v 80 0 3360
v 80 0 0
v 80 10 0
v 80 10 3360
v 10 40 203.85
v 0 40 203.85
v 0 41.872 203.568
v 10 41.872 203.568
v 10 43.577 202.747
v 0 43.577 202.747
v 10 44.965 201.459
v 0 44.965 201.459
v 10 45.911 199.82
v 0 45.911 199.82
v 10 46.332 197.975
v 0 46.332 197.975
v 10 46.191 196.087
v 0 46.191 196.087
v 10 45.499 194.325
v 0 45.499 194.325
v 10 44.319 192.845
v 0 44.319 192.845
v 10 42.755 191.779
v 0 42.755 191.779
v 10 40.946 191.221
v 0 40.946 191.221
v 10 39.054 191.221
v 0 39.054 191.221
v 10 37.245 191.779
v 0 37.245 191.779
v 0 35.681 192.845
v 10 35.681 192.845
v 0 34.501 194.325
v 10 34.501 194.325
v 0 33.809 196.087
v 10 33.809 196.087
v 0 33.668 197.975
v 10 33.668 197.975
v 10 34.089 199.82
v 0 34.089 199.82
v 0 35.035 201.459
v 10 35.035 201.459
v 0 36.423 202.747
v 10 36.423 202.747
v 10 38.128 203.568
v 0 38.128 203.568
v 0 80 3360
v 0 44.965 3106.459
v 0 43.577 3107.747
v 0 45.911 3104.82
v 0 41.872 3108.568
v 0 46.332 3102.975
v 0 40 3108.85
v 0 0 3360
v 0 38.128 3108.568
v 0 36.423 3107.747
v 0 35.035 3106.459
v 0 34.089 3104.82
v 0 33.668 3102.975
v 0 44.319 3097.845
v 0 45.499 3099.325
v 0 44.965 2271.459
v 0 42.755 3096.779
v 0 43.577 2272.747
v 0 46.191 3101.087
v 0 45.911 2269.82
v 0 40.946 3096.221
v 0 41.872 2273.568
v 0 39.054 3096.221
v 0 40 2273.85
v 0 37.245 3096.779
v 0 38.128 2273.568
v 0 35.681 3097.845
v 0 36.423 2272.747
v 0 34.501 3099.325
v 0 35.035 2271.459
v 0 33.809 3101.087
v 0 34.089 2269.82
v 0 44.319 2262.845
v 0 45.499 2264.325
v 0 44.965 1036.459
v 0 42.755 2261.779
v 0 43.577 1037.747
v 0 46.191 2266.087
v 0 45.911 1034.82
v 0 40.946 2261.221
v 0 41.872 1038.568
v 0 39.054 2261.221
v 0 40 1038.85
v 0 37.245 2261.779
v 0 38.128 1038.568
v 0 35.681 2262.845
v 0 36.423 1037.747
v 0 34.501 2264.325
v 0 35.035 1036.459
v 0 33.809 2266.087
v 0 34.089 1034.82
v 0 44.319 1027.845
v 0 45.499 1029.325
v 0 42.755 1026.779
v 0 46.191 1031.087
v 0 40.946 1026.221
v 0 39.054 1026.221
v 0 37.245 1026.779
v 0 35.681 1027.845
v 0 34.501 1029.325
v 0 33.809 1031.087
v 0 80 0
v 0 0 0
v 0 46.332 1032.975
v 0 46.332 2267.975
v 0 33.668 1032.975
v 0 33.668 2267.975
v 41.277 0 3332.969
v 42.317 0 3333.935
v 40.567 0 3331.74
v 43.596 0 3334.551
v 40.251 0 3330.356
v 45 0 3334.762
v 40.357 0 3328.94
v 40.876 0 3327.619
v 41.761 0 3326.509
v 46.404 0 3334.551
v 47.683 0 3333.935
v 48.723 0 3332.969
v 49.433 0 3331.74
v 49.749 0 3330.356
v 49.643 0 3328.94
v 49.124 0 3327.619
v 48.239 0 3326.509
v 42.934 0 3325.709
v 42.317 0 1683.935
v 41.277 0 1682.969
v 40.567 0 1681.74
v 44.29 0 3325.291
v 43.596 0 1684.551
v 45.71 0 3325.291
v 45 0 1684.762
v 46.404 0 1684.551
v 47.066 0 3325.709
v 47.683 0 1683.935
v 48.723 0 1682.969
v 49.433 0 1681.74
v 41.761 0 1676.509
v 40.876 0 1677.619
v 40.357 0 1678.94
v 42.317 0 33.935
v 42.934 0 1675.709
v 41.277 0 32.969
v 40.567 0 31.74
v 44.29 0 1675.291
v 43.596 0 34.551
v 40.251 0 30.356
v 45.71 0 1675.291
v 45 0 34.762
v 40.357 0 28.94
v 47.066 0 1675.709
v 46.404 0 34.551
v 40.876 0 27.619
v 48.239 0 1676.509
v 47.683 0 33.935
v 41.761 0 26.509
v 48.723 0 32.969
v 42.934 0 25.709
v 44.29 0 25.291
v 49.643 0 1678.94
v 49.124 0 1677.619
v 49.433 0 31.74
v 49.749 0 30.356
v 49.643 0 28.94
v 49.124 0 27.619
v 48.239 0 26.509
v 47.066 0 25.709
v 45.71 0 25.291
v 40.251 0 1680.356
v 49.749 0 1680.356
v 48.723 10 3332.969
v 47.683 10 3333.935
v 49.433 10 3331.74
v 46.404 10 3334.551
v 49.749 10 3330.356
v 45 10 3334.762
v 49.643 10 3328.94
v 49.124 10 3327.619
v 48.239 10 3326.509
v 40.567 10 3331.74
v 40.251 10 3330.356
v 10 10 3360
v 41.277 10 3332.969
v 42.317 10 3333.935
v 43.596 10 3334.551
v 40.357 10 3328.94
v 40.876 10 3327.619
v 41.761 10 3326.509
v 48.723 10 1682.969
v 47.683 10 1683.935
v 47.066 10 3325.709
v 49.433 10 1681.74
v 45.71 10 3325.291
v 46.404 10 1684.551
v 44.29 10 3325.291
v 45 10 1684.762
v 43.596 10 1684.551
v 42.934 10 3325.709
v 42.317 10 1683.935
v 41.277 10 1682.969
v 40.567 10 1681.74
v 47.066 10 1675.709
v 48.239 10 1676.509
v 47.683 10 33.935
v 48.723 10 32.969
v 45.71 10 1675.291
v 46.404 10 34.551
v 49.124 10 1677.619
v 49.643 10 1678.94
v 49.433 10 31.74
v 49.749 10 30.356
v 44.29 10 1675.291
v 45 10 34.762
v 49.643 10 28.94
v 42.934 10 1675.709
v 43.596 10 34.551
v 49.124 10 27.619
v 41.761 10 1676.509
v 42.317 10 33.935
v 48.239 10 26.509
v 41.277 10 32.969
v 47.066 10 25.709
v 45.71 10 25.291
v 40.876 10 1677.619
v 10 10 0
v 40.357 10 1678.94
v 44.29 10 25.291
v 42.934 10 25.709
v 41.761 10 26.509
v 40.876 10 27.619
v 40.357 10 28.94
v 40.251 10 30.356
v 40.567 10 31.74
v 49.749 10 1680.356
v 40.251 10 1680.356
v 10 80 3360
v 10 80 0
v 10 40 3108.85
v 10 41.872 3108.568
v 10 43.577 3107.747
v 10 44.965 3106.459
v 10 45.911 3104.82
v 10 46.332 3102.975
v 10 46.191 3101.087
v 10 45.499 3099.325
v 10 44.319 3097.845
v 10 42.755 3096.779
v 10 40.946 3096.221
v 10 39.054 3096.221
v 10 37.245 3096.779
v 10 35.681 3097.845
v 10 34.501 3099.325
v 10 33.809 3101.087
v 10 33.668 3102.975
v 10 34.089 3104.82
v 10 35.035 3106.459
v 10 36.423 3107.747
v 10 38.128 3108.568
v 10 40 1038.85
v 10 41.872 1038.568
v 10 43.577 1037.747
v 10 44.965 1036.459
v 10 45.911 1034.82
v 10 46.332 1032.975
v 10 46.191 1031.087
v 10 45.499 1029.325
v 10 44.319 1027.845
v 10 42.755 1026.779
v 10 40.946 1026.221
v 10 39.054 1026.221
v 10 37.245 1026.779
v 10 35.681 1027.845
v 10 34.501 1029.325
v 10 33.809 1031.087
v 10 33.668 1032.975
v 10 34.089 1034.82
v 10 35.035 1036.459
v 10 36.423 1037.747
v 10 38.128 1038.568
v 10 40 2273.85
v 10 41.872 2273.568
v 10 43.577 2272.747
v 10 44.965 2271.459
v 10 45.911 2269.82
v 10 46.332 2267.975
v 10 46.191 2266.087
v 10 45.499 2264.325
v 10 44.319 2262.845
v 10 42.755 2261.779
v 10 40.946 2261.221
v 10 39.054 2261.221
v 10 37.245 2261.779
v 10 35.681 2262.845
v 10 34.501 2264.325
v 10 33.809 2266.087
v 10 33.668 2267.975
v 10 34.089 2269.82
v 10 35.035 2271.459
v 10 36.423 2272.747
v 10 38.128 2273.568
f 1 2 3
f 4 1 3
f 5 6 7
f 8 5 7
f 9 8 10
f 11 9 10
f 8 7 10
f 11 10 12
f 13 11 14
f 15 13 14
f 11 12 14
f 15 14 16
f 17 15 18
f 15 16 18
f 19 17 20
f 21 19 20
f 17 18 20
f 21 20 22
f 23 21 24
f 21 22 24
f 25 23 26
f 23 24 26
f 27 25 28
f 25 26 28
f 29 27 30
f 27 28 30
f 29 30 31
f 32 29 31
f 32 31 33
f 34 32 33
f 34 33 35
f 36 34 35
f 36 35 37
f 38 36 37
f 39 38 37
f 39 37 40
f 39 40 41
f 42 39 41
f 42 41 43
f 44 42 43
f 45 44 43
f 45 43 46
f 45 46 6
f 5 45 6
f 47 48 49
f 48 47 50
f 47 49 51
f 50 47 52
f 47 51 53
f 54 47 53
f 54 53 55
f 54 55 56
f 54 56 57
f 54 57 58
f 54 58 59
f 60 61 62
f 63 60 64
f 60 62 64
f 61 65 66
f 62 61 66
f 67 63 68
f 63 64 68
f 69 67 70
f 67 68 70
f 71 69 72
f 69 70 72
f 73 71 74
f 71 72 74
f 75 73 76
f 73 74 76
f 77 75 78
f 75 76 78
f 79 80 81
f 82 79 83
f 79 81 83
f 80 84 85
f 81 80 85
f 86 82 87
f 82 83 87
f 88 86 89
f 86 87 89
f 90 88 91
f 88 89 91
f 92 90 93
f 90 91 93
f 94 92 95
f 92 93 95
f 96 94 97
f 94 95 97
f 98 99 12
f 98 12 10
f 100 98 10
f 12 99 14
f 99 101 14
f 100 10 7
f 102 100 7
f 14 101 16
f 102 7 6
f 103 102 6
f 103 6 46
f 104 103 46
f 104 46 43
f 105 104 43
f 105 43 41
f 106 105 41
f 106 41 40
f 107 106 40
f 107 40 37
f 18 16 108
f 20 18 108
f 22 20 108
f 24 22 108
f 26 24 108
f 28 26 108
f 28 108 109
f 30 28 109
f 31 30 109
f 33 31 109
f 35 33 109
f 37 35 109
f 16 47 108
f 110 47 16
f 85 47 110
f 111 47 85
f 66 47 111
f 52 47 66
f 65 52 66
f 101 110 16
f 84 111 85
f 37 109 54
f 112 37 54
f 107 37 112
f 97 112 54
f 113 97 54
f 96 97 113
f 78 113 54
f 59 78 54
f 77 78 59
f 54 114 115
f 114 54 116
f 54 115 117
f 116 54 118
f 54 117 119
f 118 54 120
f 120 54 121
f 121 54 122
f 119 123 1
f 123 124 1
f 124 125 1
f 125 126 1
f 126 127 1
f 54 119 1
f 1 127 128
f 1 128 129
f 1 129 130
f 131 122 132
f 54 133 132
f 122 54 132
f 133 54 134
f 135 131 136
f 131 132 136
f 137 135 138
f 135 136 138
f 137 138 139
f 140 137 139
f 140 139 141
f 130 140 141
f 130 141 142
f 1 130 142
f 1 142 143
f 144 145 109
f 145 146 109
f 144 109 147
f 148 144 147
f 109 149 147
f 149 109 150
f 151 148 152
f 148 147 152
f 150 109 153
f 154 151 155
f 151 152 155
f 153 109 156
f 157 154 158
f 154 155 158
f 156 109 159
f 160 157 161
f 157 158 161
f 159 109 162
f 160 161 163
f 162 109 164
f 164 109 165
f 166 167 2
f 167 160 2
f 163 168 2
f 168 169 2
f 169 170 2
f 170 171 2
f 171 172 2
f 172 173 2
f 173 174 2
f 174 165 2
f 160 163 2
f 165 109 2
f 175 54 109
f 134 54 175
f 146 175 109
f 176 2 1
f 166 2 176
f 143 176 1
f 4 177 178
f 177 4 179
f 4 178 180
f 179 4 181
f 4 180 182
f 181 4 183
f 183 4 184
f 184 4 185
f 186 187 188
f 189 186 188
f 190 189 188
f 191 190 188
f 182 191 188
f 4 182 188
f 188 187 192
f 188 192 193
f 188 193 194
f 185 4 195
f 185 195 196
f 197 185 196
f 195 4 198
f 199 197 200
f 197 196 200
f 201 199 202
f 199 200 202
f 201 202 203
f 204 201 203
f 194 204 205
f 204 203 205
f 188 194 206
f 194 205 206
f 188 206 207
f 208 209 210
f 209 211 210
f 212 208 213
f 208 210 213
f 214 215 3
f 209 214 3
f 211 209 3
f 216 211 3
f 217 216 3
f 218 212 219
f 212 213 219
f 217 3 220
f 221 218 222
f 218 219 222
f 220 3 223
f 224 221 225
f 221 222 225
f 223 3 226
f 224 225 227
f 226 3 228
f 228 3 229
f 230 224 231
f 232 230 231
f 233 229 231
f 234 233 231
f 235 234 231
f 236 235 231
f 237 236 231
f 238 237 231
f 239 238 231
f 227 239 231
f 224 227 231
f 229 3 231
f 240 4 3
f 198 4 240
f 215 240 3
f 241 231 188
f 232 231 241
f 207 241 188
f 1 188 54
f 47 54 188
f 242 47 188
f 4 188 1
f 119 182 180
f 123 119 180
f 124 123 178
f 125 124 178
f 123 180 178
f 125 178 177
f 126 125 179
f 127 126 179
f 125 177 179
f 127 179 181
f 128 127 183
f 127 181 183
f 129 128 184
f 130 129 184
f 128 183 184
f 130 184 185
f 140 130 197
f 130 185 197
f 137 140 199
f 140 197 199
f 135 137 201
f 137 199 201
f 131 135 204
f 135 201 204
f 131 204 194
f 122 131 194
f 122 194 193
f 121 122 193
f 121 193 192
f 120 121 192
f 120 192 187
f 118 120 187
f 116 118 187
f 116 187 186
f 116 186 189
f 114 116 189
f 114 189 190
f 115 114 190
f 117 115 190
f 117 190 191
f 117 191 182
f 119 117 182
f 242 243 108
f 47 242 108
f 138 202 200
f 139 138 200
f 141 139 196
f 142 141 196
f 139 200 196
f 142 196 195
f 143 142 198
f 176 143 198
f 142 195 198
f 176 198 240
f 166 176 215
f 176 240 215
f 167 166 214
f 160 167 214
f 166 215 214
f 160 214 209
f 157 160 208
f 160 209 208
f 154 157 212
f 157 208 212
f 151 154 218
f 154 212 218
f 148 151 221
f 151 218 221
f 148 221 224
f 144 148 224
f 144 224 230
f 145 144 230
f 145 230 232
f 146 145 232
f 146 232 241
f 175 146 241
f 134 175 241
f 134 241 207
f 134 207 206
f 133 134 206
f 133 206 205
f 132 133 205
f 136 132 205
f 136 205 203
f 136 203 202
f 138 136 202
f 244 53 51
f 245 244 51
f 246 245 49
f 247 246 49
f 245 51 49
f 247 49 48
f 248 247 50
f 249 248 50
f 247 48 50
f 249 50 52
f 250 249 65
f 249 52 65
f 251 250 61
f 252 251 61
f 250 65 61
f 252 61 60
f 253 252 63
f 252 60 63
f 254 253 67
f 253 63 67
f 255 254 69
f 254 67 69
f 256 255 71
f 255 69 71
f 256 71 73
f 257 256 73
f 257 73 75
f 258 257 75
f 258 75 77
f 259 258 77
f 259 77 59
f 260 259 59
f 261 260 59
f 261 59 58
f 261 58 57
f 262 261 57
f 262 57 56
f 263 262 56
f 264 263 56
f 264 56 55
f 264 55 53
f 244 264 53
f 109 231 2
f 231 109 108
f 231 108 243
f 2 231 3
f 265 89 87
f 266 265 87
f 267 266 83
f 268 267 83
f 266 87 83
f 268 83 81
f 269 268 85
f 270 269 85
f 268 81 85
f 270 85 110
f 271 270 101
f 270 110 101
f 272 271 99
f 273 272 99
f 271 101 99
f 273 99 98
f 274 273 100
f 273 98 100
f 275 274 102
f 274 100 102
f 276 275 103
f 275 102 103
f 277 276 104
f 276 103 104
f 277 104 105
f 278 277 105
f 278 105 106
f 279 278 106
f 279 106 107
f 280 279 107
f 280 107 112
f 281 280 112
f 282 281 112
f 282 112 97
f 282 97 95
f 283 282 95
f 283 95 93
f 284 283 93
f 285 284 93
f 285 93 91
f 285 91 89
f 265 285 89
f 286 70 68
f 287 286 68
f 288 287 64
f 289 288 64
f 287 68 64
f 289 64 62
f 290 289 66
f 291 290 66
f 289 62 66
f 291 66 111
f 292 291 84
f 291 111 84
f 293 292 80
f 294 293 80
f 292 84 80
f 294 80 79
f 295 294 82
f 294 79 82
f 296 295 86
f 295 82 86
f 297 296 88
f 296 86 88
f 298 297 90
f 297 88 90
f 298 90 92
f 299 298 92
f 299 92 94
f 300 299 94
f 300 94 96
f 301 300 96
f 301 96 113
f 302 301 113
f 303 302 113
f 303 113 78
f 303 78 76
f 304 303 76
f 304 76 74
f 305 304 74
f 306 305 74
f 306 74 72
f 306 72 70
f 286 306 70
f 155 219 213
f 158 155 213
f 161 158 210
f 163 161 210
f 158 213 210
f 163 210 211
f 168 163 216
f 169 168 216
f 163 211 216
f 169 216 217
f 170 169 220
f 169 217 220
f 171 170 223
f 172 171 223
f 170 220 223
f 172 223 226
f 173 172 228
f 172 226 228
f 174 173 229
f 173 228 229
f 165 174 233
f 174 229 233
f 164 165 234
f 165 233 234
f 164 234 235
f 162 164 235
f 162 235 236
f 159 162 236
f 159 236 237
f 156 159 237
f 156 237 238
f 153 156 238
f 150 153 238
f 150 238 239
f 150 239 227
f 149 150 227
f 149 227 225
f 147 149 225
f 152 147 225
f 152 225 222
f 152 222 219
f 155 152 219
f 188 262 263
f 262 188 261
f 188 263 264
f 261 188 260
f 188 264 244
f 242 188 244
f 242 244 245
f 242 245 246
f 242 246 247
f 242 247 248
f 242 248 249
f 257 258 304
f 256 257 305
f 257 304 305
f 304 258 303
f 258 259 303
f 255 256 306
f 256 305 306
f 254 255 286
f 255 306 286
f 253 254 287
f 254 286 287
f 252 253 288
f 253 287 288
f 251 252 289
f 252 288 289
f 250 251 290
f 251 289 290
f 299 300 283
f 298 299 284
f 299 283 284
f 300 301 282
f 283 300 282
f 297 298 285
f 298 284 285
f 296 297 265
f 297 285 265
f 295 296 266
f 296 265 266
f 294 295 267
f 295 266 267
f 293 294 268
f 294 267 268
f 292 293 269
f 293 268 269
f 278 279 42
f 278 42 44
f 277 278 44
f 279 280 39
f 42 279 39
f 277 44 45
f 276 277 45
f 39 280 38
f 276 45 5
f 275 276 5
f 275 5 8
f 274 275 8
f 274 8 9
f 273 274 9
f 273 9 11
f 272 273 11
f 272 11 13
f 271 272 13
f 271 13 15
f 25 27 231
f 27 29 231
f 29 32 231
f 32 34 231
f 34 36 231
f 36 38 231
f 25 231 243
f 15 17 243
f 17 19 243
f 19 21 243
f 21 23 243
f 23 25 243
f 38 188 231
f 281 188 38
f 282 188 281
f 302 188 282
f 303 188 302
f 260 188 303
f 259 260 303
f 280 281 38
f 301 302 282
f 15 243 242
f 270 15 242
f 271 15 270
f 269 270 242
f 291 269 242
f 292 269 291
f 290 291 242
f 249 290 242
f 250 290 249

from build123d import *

# Parameters (mm, degrees)
SALIENTE_EXTRUIR1_DEPTH = 3360
CORTAR_EXTRUIR1_REACH   = 3363.904
CROQUIS2_R              = 6.35
CORTAR_EXTRUIR2_REACH   = 3363.681
CROQUIS3_R              = 4.7625


with BuildPart() as part:
    # Croquis1 → Saliente-Extruir1 (new body)
    with BuildSketch(Plane.XY):
        Polygon((0, 0), (80, 0), (80, 10), (10, 10), (10, 80), (0, 80), align=None)
    extrude(amount=SALIENTE_EXTRUIR1_DEPTH)

    # Croquis2 → Cortar-Extruir1 (cut, up to next)
    with BuildSketch(Plane.ZY, mode=Mode.PRIVATE) as cortar_extruir1_sk1:
        with Locations((3102.5, 40)):
            Circle(CROQUIS2_R)
    cortar_extruir1_tool1 = extrude(cortar_extruir1_sk1.sketch, amount=-CORTAR_EXTRUIR1_REACH, mode=Mode.PRIVATE) & part.part
    # Croquis2 → Cortar-Extruir1 (cut, up to next)
    with BuildSketch(Plane.ZY, mode=Mode.PRIVATE) as cortar_extruir1_sk2:
        with Locations((197.5, 40)):
            Circle(CROQUIS2_R)
    cortar_extruir1_tool2 = extrude(cortar_extruir1_sk2.sketch, amount=-CORTAR_EXTRUIR1_REACH, mode=Mode.PRIVATE) & part.part
    # Croquis2 → Cortar-Extruir1 (cut, up to next)
    with BuildSketch(Plane.ZY, mode=Mode.PRIVATE) as cortar_extruir1_sk3:
        with Locations((2267.5, 40)):
            Circle(CROQUIS2_R)
    cortar_extruir1_tool3 = extrude(cortar_extruir1_sk3.sketch, amount=-CORTAR_EXTRUIR1_REACH, mode=Mode.PRIVATE) & part.part
    # Croquis2 → Cortar-Extruir1 (cut, up to next)
    with BuildSketch(Plane.ZY, mode=Mode.PRIVATE) as cortar_extruir1_sk4:
        with Locations((1032.5, 40)):
            Circle(CROQUIS2_R)
    cortar_extruir1_tool4 = extrude(cortar_extruir1_sk4.sketch, amount=-CORTAR_EXTRUIR1_REACH, mode=Mode.PRIVATE) & part.part
    add(cortar_extruir1_tool1.solids().sort_by_distance((0, 40, 3102.5))[0], mode=Mode.SUBTRACT)
    add(cortar_extruir1_tool2.solids().sort_by_distance((0, 40, 197.5))[0], mode=Mode.SUBTRACT)
    add(cortar_extruir1_tool3.solids().sort_by_distance((0, 40, 2267.5))[0], mode=Mode.SUBTRACT)
    add(cortar_extruir1_tool4.solids().sort_by_distance((0, 40, 1032.5))[0], mode=Mode.SUBTRACT)

    # Croquis3 → Cortar-Extruir2 (cut, up to next)
    with BuildSketch(Plane(origin=(0, 10, 0), x_dir=(1, 0, 0), z_dir=(0, 1, 0)), mode=Mode.PRIVATE) as cortar_extruir2_sk1:
        with Locations(Location((45, -3330, 0), (0, 0, 270))):
            Circle(CROQUIS3_R)
    cortar_extruir2_tool1 = extrude(cortar_extruir2_sk1.sketch, amount=-CORTAR_EXTRUIR2_REACH, mode=Mode.PRIVATE) & part.part
    # Croquis3 → Cortar-Extruir2 (cut, up to next)
    with BuildSketch(Plane(origin=(0, 10, 0), x_dir=(1, 0, 0), z_dir=(0, 1, 0)), mode=Mode.PRIVATE) as cortar_extruir2_sk2:
        with Locations(Location((45, -1680, 0), (0, 0, 270))):
            Circle(CROQUIS3_R)
    cortar_extruir2_tool2 = extrude(cortar_extruir2_sk2.sketch, amount=-CORTAR_EXTRUIR2_REACH, mode=Mode.PRIVATE) & part.part
    # Croquis3 → Cortar-Extruir2 (cut, up to next)
    with BuildSketch(Plane(origin=(0, 10, 0), x_dir=(1, 0, 0), z_dir=(0, 1, 0)), mode=Mode.PRIVATE) as cortar_extruir2_sk3:
        with Locations(Location((45, -30, 0), (0, 0, 270))):
            Circle(CROQUIS3_R)
    cortar_extruir2_tool3 = extrude(cortar_extruir2_sk3.sketch, amount=-CORTAR_EXTRUIR2_REACH, mode=Mode.PRIVATE) & part.part
    add(cortar_extruir2_tool1.solids().sort_by_distance((45, 10, 3330))[0], mode=Mode.SUBTRACT)
    add(cortar_extruir2_tool2.solids().sort_by_distance((45, 10, 1680))[0], mode=Mode.SUBTRACT)
    add(cortar_extruir2_tool3.solids().sort_by_distance((45, 10, 30))[0], mode=Mode.SUBTRACT)


solid = part.part
